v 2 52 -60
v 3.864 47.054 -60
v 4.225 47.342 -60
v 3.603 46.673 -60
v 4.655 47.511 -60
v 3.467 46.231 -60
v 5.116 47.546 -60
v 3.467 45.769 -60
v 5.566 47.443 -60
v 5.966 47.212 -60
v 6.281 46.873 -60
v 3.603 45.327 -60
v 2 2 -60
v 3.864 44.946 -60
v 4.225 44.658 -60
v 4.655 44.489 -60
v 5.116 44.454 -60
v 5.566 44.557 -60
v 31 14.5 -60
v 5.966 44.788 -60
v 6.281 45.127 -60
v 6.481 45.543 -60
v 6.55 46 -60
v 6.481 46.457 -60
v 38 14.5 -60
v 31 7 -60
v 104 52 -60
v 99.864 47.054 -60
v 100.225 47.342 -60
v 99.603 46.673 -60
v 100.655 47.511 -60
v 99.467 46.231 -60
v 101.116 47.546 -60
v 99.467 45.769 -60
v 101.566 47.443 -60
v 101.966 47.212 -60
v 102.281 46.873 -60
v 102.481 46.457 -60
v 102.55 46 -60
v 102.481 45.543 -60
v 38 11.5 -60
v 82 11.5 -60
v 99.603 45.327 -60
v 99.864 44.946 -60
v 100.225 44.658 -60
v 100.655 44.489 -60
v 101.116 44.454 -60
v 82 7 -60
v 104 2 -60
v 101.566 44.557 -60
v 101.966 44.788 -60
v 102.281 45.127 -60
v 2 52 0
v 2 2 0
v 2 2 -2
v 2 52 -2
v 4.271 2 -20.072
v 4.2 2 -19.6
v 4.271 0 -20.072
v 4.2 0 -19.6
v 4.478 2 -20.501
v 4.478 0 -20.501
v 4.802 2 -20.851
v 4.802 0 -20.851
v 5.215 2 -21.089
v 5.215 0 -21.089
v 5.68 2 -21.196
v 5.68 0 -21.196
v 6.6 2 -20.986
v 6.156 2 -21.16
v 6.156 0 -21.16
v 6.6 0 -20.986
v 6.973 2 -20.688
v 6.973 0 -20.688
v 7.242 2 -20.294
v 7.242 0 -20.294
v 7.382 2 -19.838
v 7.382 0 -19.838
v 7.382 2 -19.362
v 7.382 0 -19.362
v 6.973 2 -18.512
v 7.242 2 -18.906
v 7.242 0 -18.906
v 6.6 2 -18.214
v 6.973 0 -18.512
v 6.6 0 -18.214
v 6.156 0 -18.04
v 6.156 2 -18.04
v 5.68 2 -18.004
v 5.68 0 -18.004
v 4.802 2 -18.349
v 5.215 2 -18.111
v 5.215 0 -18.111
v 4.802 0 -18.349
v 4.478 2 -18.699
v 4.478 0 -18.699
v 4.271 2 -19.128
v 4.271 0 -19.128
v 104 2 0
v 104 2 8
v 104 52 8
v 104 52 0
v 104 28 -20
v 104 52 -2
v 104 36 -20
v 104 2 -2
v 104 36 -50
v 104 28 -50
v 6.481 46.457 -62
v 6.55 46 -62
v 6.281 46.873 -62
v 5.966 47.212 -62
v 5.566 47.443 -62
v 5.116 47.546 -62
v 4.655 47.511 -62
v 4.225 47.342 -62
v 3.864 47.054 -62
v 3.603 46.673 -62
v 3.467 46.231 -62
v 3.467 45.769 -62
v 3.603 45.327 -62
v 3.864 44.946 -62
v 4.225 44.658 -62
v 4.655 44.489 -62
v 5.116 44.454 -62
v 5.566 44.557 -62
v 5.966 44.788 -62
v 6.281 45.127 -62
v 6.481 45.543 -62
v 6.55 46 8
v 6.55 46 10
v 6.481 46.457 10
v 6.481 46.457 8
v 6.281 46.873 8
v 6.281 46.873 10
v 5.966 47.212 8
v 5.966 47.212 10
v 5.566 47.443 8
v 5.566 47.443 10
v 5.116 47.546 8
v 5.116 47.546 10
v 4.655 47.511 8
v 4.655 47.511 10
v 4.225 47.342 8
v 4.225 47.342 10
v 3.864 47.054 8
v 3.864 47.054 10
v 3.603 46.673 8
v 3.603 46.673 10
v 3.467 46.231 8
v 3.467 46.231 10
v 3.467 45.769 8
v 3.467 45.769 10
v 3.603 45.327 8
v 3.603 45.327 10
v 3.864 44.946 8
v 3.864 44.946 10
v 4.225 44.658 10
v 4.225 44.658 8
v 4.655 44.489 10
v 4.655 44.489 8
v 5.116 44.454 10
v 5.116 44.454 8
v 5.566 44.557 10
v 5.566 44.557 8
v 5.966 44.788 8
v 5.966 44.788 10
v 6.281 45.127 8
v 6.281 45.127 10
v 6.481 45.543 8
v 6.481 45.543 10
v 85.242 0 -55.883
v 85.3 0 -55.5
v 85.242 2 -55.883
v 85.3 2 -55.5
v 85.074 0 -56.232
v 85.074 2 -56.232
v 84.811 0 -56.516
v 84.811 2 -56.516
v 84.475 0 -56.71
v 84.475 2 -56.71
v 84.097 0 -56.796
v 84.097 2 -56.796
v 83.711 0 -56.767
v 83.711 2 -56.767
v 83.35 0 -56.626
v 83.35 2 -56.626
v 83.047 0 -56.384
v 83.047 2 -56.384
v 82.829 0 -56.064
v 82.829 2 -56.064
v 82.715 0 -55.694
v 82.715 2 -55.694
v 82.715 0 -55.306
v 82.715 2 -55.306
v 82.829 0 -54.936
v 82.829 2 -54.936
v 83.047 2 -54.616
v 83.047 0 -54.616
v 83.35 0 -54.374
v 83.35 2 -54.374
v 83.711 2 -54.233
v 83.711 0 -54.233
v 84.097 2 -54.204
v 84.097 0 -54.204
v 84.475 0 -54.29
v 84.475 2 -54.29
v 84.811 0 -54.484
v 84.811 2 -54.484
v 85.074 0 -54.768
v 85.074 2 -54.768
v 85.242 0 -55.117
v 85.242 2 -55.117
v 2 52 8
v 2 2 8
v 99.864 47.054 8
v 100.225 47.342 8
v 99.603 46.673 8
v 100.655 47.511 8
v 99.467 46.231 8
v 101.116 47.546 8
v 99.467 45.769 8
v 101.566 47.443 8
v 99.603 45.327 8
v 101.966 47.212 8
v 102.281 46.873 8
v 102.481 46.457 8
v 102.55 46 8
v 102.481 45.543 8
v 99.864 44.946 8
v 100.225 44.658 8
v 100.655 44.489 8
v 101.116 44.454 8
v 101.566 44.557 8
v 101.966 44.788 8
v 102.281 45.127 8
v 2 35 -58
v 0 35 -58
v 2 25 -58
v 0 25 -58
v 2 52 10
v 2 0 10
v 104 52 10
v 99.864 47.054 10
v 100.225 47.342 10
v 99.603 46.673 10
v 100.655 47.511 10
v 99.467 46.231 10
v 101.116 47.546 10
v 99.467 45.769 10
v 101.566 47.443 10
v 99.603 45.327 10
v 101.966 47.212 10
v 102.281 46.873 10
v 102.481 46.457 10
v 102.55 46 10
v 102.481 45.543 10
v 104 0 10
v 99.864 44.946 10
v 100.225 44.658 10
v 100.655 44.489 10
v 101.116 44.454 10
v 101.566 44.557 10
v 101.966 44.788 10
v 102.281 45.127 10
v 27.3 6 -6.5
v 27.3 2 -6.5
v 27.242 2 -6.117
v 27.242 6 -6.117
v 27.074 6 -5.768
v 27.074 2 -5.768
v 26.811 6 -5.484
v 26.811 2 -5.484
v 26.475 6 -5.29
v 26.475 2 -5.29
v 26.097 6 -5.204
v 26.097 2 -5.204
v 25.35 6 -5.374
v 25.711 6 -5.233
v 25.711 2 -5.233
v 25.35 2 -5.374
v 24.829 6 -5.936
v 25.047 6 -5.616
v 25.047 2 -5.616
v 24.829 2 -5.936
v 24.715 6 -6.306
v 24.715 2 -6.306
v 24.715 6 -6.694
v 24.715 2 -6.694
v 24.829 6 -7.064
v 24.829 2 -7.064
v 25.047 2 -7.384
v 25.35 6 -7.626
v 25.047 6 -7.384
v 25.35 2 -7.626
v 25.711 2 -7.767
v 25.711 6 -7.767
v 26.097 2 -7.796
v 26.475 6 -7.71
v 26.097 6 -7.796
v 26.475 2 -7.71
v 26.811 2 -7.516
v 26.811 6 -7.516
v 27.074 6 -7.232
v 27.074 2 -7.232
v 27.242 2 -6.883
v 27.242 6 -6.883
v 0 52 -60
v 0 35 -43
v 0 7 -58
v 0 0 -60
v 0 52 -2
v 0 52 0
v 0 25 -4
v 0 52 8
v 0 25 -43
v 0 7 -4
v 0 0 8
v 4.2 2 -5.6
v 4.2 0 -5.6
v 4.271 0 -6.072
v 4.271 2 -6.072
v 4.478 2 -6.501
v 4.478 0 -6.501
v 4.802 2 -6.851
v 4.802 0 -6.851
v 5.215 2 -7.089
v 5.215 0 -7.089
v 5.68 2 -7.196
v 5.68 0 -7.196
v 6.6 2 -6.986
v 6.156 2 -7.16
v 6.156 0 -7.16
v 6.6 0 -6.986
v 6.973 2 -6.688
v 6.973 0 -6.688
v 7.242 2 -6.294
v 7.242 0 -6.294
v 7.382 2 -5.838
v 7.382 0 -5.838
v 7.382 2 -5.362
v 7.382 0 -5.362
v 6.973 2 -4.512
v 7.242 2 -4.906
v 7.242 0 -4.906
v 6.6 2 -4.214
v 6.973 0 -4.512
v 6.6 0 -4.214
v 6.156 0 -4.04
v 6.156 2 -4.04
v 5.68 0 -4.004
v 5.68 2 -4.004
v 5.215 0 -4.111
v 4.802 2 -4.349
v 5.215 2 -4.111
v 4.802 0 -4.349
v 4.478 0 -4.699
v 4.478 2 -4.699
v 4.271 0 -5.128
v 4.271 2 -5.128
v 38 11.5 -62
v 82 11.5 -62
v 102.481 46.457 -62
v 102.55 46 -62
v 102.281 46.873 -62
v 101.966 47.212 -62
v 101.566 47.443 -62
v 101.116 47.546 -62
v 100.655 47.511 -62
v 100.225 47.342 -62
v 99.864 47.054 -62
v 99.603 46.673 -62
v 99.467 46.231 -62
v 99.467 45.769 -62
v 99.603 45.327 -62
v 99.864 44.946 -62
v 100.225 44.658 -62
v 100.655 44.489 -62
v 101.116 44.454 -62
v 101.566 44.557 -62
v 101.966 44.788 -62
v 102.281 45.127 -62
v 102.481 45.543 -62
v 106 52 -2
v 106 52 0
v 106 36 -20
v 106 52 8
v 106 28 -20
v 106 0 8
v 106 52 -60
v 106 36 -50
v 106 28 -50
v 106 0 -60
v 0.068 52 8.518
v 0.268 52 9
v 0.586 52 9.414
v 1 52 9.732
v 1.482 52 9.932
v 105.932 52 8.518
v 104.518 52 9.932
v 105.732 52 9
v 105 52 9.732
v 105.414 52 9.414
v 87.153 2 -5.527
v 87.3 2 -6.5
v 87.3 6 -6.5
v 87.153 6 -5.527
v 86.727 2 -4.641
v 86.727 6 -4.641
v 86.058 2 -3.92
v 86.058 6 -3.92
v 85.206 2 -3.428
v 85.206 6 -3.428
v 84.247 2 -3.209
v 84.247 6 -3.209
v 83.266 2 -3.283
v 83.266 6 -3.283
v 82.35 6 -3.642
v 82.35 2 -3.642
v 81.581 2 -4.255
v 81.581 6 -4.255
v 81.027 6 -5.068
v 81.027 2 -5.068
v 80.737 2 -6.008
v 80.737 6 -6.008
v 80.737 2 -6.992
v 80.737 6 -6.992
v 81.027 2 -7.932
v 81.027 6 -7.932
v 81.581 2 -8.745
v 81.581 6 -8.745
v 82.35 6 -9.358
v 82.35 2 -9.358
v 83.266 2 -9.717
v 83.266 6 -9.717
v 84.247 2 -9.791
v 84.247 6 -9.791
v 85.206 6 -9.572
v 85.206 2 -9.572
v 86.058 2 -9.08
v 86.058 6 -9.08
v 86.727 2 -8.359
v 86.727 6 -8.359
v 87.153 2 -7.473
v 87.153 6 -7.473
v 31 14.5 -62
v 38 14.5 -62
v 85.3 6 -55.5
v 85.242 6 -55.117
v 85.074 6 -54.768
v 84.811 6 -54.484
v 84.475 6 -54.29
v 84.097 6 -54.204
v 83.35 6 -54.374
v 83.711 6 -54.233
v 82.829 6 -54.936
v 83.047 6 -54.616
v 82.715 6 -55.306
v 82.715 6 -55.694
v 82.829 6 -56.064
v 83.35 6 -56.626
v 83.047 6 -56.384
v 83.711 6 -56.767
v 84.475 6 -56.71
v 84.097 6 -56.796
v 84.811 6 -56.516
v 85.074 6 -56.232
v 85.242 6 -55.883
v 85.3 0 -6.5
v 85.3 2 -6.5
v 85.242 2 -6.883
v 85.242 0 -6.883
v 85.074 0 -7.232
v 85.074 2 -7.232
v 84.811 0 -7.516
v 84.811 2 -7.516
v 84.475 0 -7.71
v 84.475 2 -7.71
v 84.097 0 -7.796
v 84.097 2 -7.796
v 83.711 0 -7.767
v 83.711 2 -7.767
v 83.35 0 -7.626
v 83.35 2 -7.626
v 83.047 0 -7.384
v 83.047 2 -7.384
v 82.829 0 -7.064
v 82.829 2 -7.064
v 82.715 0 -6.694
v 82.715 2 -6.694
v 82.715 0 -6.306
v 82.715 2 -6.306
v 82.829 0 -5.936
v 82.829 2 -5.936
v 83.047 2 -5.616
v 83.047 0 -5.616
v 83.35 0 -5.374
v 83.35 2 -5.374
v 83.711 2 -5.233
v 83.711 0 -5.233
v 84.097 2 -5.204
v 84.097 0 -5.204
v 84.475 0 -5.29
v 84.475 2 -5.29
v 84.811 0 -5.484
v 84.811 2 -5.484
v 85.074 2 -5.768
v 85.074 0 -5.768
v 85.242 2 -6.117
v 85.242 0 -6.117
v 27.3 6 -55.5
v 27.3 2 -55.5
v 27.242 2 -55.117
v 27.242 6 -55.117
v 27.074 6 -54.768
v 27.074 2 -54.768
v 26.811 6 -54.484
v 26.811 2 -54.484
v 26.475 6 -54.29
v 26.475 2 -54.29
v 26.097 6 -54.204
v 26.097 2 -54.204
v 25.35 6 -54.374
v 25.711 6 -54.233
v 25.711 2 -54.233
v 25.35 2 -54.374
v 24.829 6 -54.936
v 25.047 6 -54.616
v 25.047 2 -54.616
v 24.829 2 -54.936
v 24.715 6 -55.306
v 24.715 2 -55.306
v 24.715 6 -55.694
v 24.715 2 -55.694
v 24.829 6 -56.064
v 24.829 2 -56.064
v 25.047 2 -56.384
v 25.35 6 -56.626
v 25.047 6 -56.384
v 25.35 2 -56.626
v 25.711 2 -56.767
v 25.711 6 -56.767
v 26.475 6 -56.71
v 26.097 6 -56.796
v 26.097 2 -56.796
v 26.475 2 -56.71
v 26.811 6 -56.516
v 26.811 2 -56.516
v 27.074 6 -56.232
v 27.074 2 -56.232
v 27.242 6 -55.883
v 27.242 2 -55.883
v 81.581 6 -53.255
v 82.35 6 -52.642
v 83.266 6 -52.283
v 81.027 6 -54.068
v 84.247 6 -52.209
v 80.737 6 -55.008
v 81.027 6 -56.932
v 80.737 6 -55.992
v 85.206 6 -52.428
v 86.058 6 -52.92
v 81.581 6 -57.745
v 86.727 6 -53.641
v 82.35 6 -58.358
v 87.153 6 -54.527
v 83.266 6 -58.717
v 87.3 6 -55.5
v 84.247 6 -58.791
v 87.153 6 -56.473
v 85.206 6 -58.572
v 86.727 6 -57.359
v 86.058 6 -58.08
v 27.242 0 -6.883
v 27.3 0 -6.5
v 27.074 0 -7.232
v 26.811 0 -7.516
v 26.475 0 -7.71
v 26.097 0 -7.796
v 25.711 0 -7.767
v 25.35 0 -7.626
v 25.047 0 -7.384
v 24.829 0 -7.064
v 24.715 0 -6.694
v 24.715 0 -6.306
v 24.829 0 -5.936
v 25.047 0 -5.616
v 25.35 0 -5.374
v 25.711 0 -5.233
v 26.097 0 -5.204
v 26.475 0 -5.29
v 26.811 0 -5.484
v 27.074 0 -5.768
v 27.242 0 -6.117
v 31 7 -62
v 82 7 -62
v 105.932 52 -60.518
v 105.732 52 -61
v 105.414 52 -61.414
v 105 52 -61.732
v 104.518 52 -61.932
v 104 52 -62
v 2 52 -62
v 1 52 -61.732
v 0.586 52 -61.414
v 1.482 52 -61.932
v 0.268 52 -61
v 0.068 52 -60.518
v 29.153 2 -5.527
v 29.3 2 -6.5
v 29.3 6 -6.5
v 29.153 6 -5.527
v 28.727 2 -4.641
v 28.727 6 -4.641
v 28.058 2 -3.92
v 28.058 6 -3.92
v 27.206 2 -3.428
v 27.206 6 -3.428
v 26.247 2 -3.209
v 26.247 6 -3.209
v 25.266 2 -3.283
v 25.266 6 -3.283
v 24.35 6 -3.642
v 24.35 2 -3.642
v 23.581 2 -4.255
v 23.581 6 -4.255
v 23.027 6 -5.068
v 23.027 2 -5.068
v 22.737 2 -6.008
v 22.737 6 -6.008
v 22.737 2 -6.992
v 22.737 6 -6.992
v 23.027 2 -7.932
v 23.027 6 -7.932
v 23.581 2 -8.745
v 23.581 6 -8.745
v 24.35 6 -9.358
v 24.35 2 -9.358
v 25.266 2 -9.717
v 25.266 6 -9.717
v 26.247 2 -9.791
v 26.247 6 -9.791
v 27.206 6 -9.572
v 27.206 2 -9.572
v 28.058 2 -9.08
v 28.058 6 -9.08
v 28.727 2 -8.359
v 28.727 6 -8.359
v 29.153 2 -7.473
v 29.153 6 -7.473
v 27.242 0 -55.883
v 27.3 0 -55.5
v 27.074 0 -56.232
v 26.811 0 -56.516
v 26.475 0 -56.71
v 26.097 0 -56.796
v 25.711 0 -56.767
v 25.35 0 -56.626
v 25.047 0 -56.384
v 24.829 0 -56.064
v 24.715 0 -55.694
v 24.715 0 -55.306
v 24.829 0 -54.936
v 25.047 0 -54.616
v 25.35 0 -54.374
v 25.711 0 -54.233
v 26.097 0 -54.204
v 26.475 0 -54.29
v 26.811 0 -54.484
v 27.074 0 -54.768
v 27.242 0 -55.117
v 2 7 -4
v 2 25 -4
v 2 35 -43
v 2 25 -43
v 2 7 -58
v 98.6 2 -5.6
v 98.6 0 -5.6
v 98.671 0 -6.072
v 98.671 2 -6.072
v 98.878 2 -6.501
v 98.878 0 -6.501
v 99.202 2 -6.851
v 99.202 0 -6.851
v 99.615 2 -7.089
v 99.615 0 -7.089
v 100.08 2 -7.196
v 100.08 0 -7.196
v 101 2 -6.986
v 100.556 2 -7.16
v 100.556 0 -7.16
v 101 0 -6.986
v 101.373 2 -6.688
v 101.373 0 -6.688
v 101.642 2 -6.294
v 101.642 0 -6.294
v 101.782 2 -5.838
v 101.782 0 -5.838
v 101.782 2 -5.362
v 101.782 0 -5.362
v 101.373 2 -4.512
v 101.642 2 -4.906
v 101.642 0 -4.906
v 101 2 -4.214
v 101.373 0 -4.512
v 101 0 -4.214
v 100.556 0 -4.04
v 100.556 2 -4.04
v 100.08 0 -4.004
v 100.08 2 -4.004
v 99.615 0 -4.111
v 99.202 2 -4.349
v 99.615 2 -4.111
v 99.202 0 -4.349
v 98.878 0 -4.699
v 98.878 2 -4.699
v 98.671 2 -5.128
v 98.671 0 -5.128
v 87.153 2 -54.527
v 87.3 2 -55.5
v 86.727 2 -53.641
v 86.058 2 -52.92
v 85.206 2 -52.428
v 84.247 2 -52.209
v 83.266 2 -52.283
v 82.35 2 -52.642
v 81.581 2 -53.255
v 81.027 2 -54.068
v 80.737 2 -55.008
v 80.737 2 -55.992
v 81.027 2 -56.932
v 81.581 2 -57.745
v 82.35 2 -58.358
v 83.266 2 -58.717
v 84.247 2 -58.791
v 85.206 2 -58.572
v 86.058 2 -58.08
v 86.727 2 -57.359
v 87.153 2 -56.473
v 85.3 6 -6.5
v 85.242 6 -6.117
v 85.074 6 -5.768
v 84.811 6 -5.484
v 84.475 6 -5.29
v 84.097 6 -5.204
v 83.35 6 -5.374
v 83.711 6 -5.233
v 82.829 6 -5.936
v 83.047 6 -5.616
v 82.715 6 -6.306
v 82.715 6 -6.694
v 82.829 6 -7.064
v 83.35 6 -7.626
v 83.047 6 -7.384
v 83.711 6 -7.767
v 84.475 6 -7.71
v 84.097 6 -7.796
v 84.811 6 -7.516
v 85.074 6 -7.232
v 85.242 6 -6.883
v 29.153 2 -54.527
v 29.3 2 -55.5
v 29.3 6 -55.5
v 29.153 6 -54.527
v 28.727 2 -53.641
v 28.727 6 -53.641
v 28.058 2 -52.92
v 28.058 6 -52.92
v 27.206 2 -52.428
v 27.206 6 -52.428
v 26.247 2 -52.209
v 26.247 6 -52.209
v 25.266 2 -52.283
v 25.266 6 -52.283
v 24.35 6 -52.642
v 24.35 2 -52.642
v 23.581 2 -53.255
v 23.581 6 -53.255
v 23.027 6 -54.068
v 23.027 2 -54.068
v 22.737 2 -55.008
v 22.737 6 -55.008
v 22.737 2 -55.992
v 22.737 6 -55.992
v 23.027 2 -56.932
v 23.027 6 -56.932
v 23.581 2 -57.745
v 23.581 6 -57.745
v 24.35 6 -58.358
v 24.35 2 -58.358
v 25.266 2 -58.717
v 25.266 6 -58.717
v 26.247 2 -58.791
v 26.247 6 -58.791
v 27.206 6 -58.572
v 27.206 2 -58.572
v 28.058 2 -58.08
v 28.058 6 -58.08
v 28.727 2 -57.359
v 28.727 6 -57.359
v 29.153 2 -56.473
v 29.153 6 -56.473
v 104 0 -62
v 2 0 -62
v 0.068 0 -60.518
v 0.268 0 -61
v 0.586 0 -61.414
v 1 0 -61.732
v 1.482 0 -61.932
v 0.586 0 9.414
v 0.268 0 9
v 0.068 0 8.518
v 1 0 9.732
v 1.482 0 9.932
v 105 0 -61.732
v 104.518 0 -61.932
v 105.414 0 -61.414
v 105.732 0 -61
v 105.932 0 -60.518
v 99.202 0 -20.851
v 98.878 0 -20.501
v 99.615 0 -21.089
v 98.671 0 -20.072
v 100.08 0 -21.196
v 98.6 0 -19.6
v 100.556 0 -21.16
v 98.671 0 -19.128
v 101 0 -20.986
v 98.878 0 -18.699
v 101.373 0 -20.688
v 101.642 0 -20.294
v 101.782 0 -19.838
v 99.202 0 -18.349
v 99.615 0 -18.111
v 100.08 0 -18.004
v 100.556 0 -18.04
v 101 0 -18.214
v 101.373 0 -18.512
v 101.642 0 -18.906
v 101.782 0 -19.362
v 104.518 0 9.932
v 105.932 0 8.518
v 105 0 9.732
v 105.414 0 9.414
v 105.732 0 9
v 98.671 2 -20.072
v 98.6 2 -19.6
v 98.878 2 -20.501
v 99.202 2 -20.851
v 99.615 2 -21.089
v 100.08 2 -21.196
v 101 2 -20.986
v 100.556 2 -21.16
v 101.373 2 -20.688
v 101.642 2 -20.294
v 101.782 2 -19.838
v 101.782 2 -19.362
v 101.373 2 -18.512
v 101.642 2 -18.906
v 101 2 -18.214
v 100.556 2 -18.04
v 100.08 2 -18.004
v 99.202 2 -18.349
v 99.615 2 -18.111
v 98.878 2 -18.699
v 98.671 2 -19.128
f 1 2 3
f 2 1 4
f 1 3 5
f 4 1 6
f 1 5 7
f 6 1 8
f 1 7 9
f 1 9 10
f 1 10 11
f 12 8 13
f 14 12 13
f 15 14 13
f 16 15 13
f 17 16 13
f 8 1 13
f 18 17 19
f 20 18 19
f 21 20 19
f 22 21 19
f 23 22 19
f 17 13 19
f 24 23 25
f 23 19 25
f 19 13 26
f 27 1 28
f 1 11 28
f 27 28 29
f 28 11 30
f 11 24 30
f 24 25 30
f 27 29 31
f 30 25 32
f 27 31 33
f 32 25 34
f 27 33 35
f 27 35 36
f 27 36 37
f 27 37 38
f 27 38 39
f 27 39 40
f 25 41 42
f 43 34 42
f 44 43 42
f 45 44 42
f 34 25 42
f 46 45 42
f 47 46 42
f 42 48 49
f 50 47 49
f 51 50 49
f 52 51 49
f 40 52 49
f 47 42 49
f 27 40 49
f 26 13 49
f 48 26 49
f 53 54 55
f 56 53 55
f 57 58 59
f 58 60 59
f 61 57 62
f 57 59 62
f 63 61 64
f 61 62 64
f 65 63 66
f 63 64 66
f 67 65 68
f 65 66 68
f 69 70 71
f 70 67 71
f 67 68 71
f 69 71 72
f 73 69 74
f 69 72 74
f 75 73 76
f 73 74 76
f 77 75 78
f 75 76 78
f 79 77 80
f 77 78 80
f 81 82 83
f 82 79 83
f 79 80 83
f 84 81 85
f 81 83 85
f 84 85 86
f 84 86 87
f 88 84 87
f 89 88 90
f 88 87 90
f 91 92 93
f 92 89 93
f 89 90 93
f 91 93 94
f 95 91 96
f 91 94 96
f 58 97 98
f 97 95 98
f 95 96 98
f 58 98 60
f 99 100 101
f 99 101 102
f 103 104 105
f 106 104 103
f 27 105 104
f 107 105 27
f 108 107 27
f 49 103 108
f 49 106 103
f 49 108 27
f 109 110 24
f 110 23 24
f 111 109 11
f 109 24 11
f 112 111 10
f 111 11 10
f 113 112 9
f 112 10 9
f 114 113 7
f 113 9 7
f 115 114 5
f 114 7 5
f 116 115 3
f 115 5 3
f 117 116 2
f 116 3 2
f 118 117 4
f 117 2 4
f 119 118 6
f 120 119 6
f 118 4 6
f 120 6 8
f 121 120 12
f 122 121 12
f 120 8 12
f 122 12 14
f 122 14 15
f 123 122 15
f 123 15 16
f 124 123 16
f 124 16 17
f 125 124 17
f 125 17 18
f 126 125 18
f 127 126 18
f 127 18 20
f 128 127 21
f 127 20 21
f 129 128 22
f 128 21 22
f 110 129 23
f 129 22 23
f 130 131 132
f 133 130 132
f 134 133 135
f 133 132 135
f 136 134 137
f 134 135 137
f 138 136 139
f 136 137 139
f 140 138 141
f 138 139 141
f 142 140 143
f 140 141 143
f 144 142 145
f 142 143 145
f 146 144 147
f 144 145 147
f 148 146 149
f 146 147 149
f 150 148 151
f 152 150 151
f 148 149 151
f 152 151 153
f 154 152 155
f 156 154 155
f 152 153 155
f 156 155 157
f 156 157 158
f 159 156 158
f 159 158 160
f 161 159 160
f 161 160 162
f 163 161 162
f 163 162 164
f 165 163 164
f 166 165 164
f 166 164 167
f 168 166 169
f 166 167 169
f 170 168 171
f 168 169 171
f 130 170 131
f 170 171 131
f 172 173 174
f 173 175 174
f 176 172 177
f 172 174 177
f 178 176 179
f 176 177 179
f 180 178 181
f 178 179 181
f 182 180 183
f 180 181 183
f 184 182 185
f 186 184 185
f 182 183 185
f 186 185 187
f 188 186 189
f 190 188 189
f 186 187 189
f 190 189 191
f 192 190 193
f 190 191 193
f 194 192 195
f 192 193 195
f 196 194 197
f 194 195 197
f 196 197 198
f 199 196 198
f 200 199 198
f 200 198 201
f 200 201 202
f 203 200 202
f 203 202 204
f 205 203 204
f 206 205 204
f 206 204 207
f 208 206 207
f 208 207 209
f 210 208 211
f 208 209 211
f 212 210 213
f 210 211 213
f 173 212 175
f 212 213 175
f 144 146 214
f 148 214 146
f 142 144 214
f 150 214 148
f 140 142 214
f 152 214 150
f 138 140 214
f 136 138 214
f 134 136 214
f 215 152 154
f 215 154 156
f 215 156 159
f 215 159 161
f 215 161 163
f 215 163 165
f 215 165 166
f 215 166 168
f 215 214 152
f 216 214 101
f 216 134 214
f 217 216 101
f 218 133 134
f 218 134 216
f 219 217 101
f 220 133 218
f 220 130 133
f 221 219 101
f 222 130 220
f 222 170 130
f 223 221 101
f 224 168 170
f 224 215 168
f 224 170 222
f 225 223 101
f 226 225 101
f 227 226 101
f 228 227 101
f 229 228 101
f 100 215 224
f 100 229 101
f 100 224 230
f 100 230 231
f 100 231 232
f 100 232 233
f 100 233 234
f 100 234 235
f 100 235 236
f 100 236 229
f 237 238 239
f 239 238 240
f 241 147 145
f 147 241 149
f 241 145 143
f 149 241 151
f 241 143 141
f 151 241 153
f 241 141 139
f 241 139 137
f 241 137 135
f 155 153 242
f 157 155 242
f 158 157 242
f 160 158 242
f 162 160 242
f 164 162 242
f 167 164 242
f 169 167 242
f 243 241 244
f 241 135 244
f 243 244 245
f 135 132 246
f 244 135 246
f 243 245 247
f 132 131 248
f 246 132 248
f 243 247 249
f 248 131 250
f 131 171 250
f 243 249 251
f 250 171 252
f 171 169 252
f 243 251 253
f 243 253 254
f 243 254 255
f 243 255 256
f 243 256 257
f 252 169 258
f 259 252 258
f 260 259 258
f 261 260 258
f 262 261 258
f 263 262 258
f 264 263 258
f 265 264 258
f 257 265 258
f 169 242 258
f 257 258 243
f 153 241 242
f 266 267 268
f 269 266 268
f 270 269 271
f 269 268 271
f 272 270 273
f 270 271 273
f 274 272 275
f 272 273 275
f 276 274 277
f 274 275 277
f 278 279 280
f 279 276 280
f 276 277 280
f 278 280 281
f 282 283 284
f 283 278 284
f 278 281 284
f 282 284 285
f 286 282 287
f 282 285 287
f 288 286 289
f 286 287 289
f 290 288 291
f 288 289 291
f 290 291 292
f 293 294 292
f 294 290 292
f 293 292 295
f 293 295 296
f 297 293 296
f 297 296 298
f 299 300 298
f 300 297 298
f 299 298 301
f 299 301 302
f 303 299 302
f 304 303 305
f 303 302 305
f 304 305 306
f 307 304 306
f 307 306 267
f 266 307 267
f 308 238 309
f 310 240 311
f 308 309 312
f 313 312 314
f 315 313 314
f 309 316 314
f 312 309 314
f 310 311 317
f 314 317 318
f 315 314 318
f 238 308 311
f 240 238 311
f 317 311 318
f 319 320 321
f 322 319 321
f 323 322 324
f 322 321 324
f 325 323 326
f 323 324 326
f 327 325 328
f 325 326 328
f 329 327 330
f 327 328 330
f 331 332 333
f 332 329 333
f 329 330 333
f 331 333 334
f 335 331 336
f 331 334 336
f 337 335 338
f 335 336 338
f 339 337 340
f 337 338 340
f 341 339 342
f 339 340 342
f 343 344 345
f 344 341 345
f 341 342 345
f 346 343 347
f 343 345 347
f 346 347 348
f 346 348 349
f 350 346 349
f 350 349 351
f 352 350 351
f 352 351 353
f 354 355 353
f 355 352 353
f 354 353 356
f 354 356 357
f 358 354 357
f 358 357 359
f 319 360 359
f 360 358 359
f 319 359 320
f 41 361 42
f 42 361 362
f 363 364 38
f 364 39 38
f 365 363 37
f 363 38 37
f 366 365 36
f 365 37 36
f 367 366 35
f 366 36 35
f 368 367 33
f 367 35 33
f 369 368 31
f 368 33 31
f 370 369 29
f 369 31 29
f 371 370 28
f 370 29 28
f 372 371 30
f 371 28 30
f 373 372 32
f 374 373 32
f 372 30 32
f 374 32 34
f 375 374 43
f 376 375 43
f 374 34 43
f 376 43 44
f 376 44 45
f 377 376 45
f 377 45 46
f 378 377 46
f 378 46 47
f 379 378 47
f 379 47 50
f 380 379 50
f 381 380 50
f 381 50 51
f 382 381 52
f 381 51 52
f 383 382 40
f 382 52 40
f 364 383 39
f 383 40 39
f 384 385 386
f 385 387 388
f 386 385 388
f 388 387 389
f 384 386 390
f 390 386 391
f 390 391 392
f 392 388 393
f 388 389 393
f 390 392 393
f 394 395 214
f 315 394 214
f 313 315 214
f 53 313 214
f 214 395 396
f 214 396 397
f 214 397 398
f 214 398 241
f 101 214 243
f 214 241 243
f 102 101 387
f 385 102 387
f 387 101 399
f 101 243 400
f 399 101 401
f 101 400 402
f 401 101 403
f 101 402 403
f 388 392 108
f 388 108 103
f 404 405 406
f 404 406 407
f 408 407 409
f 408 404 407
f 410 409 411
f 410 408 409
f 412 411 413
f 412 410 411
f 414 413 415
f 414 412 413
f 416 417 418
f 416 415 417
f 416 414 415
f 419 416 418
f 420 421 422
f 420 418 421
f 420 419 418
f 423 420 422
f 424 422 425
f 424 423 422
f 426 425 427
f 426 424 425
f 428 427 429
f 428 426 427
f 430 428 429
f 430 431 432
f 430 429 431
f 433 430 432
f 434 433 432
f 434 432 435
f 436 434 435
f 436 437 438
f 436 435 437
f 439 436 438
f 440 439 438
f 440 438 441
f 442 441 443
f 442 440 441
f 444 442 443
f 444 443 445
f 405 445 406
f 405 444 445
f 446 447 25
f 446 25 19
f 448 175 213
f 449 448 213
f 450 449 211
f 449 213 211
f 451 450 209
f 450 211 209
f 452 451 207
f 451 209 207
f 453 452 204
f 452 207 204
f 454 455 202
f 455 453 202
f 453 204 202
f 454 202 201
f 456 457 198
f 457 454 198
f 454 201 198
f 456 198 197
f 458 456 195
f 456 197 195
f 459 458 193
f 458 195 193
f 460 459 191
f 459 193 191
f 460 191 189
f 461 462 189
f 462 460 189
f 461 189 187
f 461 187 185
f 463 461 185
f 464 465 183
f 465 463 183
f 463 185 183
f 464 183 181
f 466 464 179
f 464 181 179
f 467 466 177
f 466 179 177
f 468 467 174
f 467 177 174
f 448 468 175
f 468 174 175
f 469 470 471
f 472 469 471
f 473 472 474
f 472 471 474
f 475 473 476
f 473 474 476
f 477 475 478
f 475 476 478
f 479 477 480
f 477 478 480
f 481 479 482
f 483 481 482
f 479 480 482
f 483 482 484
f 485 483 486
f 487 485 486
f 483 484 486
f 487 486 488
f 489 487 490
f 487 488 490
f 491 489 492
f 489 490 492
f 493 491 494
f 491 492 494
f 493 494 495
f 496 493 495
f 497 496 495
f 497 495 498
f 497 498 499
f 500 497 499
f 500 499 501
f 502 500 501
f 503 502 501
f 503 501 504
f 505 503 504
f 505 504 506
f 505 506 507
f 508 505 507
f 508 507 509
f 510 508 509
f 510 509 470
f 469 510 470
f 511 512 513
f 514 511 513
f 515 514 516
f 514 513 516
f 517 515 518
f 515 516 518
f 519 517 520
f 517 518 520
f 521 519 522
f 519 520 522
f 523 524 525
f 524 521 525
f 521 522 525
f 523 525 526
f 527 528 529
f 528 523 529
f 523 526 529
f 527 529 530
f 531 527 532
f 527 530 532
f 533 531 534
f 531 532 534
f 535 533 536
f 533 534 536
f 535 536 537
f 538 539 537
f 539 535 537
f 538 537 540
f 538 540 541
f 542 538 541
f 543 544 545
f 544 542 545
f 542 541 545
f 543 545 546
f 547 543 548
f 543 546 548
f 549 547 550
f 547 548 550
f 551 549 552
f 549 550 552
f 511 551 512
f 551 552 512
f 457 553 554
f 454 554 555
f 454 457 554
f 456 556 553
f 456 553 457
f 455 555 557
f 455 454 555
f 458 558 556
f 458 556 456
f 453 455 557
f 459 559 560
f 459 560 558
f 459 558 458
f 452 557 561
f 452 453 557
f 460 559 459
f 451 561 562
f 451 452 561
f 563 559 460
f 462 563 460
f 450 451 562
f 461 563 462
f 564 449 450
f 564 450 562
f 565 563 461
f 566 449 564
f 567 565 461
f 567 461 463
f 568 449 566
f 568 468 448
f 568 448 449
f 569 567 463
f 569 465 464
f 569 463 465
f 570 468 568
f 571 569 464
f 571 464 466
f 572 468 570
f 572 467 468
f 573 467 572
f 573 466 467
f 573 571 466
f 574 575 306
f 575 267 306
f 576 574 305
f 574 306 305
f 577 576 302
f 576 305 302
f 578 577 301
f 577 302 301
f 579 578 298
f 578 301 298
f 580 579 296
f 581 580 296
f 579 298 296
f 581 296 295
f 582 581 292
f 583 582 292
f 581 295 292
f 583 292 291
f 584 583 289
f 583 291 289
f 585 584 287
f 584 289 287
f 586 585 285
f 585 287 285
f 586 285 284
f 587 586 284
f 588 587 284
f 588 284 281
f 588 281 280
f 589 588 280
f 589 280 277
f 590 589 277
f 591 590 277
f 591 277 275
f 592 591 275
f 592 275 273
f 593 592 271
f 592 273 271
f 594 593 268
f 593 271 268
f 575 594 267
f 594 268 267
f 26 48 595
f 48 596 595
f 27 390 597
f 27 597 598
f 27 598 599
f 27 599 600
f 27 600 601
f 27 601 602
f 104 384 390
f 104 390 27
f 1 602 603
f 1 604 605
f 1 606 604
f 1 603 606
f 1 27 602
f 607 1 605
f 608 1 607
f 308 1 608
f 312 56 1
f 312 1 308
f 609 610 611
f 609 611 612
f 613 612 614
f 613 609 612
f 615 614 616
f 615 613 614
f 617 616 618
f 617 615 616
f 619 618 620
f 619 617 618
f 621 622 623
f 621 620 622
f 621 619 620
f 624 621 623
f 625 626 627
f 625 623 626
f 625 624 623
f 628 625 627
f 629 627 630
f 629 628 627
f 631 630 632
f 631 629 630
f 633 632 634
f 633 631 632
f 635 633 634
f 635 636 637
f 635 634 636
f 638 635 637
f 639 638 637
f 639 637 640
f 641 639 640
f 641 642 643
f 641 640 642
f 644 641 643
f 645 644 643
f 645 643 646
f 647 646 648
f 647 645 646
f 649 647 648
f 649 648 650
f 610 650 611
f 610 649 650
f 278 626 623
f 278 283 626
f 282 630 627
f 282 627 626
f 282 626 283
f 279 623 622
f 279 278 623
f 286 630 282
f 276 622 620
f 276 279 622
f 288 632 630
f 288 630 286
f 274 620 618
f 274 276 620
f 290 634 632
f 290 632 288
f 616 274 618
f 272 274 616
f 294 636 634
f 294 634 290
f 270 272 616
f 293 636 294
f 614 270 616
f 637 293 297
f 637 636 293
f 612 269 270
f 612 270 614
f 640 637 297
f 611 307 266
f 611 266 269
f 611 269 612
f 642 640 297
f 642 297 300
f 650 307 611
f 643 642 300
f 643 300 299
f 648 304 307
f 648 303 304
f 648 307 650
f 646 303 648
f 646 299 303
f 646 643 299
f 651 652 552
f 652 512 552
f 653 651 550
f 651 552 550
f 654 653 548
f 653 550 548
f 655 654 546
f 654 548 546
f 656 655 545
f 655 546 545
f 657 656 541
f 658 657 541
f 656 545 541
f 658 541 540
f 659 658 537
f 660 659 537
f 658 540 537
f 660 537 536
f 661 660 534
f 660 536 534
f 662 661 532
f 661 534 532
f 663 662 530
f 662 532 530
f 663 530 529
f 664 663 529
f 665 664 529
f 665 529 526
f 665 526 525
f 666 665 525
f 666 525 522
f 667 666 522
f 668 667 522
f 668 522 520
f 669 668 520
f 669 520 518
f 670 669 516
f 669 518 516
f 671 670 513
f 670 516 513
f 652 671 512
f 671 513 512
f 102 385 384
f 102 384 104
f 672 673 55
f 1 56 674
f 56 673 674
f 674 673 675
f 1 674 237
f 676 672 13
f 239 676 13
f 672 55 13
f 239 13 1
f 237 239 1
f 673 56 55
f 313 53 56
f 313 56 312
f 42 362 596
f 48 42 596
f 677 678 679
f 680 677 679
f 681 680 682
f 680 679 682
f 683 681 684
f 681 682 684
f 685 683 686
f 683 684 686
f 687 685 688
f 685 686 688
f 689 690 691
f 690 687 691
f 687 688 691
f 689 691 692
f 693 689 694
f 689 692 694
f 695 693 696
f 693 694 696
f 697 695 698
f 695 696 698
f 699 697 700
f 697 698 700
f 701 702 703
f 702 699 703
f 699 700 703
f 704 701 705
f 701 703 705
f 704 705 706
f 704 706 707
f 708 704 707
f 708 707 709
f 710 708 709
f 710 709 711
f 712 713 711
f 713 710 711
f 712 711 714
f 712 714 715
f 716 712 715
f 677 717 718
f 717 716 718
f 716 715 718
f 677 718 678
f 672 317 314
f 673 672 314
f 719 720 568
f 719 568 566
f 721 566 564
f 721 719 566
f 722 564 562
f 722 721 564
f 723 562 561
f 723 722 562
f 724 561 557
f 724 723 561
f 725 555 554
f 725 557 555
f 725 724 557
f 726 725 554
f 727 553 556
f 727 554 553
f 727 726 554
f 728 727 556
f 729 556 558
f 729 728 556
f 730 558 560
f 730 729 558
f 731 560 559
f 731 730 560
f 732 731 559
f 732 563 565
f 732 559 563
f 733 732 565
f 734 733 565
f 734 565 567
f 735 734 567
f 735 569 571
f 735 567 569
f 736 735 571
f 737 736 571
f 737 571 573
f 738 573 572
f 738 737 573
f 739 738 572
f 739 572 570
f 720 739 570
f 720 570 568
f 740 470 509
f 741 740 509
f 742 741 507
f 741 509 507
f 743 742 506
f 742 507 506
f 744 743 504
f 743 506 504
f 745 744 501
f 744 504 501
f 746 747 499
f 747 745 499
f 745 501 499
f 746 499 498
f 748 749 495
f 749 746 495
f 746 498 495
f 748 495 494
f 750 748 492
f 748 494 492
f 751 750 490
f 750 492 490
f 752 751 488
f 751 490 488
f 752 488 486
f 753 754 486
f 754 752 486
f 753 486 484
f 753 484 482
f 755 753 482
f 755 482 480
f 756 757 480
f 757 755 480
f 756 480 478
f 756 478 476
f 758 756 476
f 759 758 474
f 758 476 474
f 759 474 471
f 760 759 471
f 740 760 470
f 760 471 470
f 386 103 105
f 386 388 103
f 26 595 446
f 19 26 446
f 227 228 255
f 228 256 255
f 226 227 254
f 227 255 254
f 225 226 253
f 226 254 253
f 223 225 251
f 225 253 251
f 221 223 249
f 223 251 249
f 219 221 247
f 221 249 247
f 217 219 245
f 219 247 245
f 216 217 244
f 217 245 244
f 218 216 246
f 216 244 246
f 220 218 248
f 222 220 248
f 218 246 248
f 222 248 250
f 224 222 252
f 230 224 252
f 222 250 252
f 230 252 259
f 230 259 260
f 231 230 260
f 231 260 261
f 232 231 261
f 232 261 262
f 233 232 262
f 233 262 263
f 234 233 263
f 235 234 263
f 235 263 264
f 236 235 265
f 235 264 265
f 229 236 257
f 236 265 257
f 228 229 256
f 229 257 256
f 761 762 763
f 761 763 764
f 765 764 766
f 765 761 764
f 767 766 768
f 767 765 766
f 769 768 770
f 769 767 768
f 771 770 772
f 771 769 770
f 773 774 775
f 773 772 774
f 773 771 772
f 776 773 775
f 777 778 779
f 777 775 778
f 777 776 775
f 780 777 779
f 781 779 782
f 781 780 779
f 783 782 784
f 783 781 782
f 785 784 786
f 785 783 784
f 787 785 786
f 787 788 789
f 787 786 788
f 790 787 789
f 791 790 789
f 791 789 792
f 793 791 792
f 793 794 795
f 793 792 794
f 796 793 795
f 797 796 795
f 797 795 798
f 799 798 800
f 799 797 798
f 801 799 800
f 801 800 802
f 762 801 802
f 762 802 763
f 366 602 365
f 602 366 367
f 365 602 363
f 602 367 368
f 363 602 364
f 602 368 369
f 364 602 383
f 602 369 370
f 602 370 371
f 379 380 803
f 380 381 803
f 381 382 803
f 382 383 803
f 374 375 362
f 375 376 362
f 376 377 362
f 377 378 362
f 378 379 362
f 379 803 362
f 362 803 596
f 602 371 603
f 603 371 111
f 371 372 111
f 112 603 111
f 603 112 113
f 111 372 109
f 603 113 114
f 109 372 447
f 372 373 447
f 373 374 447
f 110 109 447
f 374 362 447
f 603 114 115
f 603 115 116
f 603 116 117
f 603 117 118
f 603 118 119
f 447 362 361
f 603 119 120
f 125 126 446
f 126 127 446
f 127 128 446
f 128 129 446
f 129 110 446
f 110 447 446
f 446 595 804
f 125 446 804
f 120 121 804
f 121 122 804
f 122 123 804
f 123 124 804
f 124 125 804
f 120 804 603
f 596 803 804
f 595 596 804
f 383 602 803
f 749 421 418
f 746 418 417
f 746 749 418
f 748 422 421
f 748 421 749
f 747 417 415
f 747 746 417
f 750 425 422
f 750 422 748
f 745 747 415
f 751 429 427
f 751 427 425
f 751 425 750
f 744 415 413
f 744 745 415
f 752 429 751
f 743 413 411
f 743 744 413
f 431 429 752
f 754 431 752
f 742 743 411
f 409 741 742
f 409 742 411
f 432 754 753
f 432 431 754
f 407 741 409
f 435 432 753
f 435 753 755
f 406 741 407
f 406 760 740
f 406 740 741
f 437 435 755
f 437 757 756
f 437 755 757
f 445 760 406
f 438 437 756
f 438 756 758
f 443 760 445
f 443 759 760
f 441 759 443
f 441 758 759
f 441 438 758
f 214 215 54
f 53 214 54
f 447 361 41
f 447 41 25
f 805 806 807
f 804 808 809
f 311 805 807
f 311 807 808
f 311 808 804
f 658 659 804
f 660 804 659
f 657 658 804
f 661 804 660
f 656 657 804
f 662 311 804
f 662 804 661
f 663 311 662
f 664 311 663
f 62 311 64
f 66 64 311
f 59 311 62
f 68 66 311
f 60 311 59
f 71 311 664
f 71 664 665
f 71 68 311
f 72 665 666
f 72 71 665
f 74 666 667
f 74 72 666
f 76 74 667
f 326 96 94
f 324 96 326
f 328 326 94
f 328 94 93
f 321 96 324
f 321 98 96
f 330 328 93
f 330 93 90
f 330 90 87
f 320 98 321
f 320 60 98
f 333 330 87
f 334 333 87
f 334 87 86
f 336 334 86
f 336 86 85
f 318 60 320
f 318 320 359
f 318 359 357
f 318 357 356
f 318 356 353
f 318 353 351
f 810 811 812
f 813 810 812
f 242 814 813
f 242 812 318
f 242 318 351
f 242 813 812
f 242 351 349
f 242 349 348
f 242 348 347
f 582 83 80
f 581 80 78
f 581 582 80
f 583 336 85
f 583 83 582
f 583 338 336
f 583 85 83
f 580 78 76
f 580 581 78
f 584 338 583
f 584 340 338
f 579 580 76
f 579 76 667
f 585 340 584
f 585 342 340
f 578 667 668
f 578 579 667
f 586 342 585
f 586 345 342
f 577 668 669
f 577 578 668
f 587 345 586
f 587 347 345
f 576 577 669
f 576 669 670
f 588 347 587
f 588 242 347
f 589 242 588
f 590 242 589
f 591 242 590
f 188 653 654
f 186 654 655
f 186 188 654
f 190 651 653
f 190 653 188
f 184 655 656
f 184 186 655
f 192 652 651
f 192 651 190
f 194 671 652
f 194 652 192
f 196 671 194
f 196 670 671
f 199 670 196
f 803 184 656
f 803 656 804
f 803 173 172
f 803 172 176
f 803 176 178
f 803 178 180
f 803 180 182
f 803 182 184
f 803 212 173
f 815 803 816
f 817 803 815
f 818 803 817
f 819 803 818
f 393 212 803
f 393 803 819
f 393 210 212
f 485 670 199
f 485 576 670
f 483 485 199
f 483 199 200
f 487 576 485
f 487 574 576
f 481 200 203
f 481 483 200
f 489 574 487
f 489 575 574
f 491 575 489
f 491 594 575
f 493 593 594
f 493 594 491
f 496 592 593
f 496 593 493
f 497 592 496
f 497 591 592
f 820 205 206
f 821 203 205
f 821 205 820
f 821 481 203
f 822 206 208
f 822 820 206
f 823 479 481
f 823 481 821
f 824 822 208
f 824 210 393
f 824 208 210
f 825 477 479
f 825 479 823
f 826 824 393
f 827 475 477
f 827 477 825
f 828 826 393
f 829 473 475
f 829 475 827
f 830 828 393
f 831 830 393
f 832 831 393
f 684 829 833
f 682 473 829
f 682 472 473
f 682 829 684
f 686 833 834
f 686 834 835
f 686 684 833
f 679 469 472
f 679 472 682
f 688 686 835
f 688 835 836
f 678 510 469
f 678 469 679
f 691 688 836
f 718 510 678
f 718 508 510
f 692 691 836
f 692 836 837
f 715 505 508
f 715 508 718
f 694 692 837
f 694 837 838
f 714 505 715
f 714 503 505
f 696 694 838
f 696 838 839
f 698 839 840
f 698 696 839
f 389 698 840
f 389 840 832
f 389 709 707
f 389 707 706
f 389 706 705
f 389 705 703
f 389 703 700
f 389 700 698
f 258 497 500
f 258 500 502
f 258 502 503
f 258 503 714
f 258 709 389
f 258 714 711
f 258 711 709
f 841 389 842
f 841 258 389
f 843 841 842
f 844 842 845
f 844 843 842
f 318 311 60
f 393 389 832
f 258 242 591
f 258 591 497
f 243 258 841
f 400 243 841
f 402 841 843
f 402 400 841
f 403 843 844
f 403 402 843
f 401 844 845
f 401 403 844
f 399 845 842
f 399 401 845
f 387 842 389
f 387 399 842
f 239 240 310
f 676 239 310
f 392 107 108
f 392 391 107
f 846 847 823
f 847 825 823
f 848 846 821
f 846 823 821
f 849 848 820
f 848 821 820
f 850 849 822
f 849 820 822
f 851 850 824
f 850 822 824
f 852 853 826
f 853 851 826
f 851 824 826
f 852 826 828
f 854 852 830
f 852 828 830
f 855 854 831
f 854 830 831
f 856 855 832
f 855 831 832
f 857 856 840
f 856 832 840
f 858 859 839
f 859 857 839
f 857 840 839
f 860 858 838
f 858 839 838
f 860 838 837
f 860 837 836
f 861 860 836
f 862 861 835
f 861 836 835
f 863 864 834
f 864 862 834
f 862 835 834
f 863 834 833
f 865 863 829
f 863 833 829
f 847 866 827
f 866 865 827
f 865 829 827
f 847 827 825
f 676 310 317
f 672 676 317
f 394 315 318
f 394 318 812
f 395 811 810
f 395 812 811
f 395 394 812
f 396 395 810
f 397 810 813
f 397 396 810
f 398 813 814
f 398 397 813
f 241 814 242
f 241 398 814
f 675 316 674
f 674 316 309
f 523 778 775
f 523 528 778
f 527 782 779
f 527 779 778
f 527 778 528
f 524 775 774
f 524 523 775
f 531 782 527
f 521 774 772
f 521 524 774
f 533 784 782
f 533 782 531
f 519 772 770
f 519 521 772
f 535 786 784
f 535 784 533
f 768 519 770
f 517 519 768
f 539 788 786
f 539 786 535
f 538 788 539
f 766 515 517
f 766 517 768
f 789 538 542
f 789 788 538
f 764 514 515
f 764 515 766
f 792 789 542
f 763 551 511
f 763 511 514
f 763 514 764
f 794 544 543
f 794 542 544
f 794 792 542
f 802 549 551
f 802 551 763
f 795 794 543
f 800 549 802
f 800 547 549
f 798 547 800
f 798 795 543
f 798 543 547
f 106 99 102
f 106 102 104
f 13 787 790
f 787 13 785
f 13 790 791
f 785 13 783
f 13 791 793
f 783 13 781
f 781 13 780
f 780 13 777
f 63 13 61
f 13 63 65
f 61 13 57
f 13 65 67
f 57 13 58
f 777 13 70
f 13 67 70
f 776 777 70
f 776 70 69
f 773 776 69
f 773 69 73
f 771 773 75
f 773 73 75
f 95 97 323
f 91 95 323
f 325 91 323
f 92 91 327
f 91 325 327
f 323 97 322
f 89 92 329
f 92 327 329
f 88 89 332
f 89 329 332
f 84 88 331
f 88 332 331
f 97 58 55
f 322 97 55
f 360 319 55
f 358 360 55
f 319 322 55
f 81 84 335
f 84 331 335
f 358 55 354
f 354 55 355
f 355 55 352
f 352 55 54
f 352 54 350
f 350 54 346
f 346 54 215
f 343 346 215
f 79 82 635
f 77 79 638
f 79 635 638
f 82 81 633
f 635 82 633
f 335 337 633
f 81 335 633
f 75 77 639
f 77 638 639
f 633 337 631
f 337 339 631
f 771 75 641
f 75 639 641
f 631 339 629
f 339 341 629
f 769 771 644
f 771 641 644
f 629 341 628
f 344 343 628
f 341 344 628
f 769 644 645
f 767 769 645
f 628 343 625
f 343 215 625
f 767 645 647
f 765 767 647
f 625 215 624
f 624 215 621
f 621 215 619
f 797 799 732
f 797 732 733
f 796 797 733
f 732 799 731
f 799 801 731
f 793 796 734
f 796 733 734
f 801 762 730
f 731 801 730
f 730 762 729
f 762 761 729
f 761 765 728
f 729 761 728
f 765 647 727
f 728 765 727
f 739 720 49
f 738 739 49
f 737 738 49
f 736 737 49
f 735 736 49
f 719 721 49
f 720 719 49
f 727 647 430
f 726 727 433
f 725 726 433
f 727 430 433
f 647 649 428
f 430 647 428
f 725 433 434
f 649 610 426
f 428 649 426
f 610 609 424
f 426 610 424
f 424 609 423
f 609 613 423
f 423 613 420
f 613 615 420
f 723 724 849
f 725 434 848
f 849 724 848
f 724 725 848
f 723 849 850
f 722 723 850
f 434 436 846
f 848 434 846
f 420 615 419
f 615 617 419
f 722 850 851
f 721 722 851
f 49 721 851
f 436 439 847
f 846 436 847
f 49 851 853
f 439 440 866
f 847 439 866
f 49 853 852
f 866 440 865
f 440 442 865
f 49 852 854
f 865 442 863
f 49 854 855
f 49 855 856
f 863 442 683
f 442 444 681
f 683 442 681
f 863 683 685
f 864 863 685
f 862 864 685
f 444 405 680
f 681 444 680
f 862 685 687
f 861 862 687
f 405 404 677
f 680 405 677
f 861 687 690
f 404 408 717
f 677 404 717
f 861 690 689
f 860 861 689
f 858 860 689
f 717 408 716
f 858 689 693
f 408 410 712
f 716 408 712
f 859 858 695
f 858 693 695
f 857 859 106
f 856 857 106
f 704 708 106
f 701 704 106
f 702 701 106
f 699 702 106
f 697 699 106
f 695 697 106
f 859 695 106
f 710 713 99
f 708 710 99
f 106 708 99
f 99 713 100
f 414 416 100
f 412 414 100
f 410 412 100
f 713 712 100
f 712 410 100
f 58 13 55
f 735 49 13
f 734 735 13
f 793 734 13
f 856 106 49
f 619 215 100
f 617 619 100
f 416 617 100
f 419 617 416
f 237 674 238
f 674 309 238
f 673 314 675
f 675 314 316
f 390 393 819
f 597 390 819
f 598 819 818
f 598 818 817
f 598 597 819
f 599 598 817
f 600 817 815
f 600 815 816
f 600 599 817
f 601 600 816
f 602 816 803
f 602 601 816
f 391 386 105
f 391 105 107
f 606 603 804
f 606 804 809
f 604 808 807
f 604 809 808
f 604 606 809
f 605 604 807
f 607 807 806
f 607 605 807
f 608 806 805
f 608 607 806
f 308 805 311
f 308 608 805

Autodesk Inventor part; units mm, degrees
ref_plane "YZ Plane" through (0, 0, 0) normal (1, 0, 0) x (0, 1, 0)
ref_plane "XZ Plane" through (0, 0, 0) normal (0, 1, 0) x (-1, 0, 0)
ref_plane "XY Plane" through (0, 0, 0) normal (0, 0, 1) x (1, 0, 0)
sketch "Náčrt1" plane through (0, 0, 0) normal (0, 1, 0) x (-1, 0, 0)
  line L0 (0, 0) -> (-106, 0)
  line L1 (-106, 0) -> (-106, -62)
  line L2 (-106, -62) -> (0, -62)
  line L3 (0, -62) -> (0, 0)
  line L4 (-104, -2) -> (-2, -2)
  line L5 (-2, -2) -> (-2, -60)
  line L6 (-2, -60) -> (-104, -60)
  line L7 (-104, -60) -> (-104, -2)
  line L8 (-5.8, 0) -> (-5.8, -18) construction
  circle A0 centre (-5.8, -19.6) radius 1.6
  line L9 (0, -19.6) -> (-4.2, -19.6) construction
  line L10 (-7.4, 0) -> (-7.4, -5.6) construction
  circle A1 centre (-5.8, -5.6) radius 1.6
  line L11 (0, -7.2) -> (-5.8, -7.2) construction
  line L12 (-53, 11.0609) -> (-53, -73.3805) construction
  line L13 (-100.2, 0) -> (-100.2, -18) construction
  circle A2 centre (-100.2, -19.6) radius 1.6
  line L14 (-106, -19.6) -> (-101.8, -19.6) construction
  line L15 (-98.6, 0) -> (-98.6, -5.6) construction
  circle A3 centre (-100.2, -5.6) radius 1.6
  line L16 (-106, -7.2) -> (-100.2, -7.2) construction
  dimension "d0" = 62
  dimension "d1" = 106
  dimension "d2" = 2
  dimension "d8" = 18
  dimension "d9" = 4.2
  dimension "d10" = 3.2
  dimension "d13" = 5.8
  dimension "d14" = 5.6
  dimension "d15" = 3.2
extrude "Vysunutí1" add sketch "Náčrt1" along normal blind 2 contours L4 L5 L6 L7 | A0 | A1 | A2 | A3
extrude "Vysunutí2" add sketch "Náčrt1" along normal blind 52 contours L3 L2 L1 L0
extrude "Vysunutí3" cut sketch "Náčrt1" along normal blind 2 contours A0 | A1 | A2 | A3
sketch "Náčrt2" plane through (0, 2, 0) normal (0, 1, 0) x (1, 0, 0)
  circle A0 centre (84, 55.5) radius 1.3
  line L0 (2, 60) -> (104, 60) projected
  circle A1 centre (26, 55.5) radius 1.3
  line L1 (2, 2) -> (2, 60) projected
  circle A2 centre (26, 6.5) radius 1.3
  circle A3 centre (84, 6.5) radius 1.3
  line L2 (104, 2) -> (2, 2) projected
  circle A4 centre (26, 6.5) radius 3.3
  circle A5 centre (26, 55.5) radius 3.3
  circle A6 centre (84, 55.5) radius 3.3
  circle A7 centre (84, 6.5) radius 3.3
  point P0 (0, 0)
  dimension "d19" = 4.5
  dimension "d20" = 2.6
  dimension "d21" = 2.6
  dimension "d22" = 58
  dimension "d23" = 24
  dimension "d24" = 4.5
  dimension "d25" = 2.6
  dimension "d26" = 24
  dimension "d27" = 2.6
  dimension "d28" = 58
  dimension "d29" = 4.5
  dimension "d30" = 4.5
  dimension "d31" = 49
  dimension "d32" = 2
  dimension "d33" = 2
  dimension "d34" = 2
  dimension "d35" = 2
extrude "Vysunutí4" add sketch "Náčrt2" along normal blind 4
extrude "Vysunutí5" cut sketch "Náčrt2" against normal blind 2 contours A0 | A1 | A2 | A3
sketch "Náčrt3" plane through (0, 0, -62) normal (-1, 0, 0) x (0, 0, 1)
  line L0 (4, 7) -> (58, 7)
  line L1 (58, 7) -> (58, 25)
  line L2 (58, 25) -> (4, 25)
  line L3 (4, 25) -> (4, 7)
  line L4 (9.8, 6) -> (3.2, 6) projected
  line L5 (2, 2) -> (2, 52) projected
  line L6 (60, 2) -> (60, 52) projected
  point P0 (62, 0)
  dimension "d40" = 1
  dimension "d41" = 54
  dimension "d42" = 18
  dimension "d43" = 2
  dimension "d44" = 2
extrude "Vysunutí6" cut sketch "Náčrt3" against normal blind 2
sketch "Náčrt4" plane through (106, 0, -62) normal (0, 0, -1) x (-1, 0, 0)
  line L0 (24, 7) -> (75, 7)
  line L1 (75, 7) -> (75, 11.5)
  line L2 (75, 11.5) -> (24, 11.5)
  line L3 (24, 11.5) -> (24, 7)
  line L4 (104, 2) -> (104, 52) projected
  line L5 (75, 11.5) -> (68, 11.5)
  line L6 (68, 11.5) -> (68, 14.5)
  line L7 (68, 14.5) -> (75, 14.5)
  line L8 (75, 14.5) -> (75, 11.5)
  line L9 (2, 2) -> (104, 2) projected
  point P0 (106, 0)
  point P1 (68, 11.5)
  dimension "d47" = 4.5
  dimension "d48" = 29
  dimension "d49" = 51
  dimension "d50" = 5
  dimension "d51" = 7.5
  dimension "d52" = 7
extrude "Vysunutí7" cut sketch "Náčrt4" against normal blind 2
sketch "Náčrt5" plane through (0, 0, 0) normal (0, -1, 0) x (1, 0, 0)
  line L0 (106, 0) -> (106, -62) projected
  line L1 (106, -2) -> (0, -2)
  line L2 (0, -2) -> (0, 10)
  line L3 (0, 10) -> (106, 10)
  line L4 (106, 10) -> (106, -2)
  line L5 (2, -2) -> (104, -2) projected
  line L6 (106, 10) -> (0, 10)
  line L7 (0, 10) -> (0, 8)
  line L8 (0, 8) -> (106, 8)
  line L9 (106, 8) -> (106, 10)
  line L10 (104, -60) -> (104, -2) projected
  line L11 (104, -2) -> (106, -2)
  line L12 (106, -2) -> (106, 10)
  line L13 (106, 10) -> (104, 10)
  line L14 (104, 10) -> (104, -2)
  line L15 (2, -2) -> (2, -60) projected
  line L16 (2, -2) -> (0, -2)
  line L17 (0, -2) -> (0, 10)
  line L18 (0, 10) -> (2, 10)
  line L19 (2, 10) -> (2, -2)
  point P0 (0, 0)
  point P1 (2, 8)
  point P2 (104, 8)
  dimension "d55" = 12
  dimension "d56" = 106
  dimension "d57" = 2
extrude "Vysunutí8" cut sketch "Náčrt5" against normal blind 52 contours L1 L19 L8 L14
extrude "Vysunutí9" add sketch "Náčrt5" against normal blind 2 contours L1 L19 L8 L14
extrude "Vysunutí10" add sketch "Náčrt5" against normal blind 52 contours L0 L1 L14 L8 L4 | L8 L14 L3 L4 | L8 L19 L3 L14 | L1 L2 L8 L19 | L8 L2 L3 L19
sketch "Náčrt6" plane through (0, 0, -62) normal (-1, 0, 0) x (0, 0, 1)
  line L0 (4, 25) -> (58, 25) projected
  line L1 (4, 25) -> (19, 25)
  line L2 (19, 25) -> (19, 35)
  line L3 (19, 35) -> (4, 35)
  line L4 (4, 35) -> (4, 25)
  point P0 (62, 0)
  dimension "d64" = 15
  dimension "d65" = 10
extrude "Vysunutí11" cut sketch "Náčrt6" against normal blind 4
fillet "Zaoblení1" radius 2 4 edges at (106, 26, -62) (0, 26, -62) (0, 26, 10) (106, 26, 10)
sketch "Náčrt7" plane through (2, 0, 10) normal (0, 0, 1) x (1, 0, 0)
  circle A0 centre (3, 46) radius 1.55
  line L0 (0, 52) -> (102, 52) projected
  line L1 (0, 0) -> (0, 52) projected
  circle A1 centre (99, 46) radius 1.55
  line L2 (102, 52) -> (102, 0) projected
  point P0 (-2, 0)
  dimension "d69" = 3.1
  dimension "d70" = 6
  dimension "d71" = 3
  dimension "d72" = 3.1
  dimension "d73" = 3
  dimension "d74" = 6
extrude "Vysunutí12" cut sketch "Náčrt7" against normal blind 400
sketch "Náčrt8" plane through (106, 0, 8) normal (1, 0, 0) x (0, 0, -1)
  line L0 (28, 36) -> (58, 36)
  line L1 (58, 36) -> (58, 28)
  line L2 (58, 28) -> (28, 28)
  line L3 (28, 28) -> (28, 36)
  line L4 (70, 0) -> (70, 52) projected
  line L5 (0, 0) -> (68, 0) projected
  point P0 (8, 0)
  dimension "d77" = 12
  dimension "d78" = 30
  dimension "d79" = 8
  dimension "d80" = 28
extrude "Vysunutí13" cut sketch "Náčrt8" against normal blind 52
equation "\"d21\" = d20"
equation "\"d24\" = d19"
equation "\"d25\" = d20"
equation "\"d26\" = d23"
equation "\"d27\" = d20"
equation "\"d28\" = d22"
equation "\"d29\" = d19"
equation "\"d30\" = d19"
equation "\"d33\" = d32"
equation "\"d34\" = d32"
equation "\"d35\" = d32"
properties part number "RPIholder"
